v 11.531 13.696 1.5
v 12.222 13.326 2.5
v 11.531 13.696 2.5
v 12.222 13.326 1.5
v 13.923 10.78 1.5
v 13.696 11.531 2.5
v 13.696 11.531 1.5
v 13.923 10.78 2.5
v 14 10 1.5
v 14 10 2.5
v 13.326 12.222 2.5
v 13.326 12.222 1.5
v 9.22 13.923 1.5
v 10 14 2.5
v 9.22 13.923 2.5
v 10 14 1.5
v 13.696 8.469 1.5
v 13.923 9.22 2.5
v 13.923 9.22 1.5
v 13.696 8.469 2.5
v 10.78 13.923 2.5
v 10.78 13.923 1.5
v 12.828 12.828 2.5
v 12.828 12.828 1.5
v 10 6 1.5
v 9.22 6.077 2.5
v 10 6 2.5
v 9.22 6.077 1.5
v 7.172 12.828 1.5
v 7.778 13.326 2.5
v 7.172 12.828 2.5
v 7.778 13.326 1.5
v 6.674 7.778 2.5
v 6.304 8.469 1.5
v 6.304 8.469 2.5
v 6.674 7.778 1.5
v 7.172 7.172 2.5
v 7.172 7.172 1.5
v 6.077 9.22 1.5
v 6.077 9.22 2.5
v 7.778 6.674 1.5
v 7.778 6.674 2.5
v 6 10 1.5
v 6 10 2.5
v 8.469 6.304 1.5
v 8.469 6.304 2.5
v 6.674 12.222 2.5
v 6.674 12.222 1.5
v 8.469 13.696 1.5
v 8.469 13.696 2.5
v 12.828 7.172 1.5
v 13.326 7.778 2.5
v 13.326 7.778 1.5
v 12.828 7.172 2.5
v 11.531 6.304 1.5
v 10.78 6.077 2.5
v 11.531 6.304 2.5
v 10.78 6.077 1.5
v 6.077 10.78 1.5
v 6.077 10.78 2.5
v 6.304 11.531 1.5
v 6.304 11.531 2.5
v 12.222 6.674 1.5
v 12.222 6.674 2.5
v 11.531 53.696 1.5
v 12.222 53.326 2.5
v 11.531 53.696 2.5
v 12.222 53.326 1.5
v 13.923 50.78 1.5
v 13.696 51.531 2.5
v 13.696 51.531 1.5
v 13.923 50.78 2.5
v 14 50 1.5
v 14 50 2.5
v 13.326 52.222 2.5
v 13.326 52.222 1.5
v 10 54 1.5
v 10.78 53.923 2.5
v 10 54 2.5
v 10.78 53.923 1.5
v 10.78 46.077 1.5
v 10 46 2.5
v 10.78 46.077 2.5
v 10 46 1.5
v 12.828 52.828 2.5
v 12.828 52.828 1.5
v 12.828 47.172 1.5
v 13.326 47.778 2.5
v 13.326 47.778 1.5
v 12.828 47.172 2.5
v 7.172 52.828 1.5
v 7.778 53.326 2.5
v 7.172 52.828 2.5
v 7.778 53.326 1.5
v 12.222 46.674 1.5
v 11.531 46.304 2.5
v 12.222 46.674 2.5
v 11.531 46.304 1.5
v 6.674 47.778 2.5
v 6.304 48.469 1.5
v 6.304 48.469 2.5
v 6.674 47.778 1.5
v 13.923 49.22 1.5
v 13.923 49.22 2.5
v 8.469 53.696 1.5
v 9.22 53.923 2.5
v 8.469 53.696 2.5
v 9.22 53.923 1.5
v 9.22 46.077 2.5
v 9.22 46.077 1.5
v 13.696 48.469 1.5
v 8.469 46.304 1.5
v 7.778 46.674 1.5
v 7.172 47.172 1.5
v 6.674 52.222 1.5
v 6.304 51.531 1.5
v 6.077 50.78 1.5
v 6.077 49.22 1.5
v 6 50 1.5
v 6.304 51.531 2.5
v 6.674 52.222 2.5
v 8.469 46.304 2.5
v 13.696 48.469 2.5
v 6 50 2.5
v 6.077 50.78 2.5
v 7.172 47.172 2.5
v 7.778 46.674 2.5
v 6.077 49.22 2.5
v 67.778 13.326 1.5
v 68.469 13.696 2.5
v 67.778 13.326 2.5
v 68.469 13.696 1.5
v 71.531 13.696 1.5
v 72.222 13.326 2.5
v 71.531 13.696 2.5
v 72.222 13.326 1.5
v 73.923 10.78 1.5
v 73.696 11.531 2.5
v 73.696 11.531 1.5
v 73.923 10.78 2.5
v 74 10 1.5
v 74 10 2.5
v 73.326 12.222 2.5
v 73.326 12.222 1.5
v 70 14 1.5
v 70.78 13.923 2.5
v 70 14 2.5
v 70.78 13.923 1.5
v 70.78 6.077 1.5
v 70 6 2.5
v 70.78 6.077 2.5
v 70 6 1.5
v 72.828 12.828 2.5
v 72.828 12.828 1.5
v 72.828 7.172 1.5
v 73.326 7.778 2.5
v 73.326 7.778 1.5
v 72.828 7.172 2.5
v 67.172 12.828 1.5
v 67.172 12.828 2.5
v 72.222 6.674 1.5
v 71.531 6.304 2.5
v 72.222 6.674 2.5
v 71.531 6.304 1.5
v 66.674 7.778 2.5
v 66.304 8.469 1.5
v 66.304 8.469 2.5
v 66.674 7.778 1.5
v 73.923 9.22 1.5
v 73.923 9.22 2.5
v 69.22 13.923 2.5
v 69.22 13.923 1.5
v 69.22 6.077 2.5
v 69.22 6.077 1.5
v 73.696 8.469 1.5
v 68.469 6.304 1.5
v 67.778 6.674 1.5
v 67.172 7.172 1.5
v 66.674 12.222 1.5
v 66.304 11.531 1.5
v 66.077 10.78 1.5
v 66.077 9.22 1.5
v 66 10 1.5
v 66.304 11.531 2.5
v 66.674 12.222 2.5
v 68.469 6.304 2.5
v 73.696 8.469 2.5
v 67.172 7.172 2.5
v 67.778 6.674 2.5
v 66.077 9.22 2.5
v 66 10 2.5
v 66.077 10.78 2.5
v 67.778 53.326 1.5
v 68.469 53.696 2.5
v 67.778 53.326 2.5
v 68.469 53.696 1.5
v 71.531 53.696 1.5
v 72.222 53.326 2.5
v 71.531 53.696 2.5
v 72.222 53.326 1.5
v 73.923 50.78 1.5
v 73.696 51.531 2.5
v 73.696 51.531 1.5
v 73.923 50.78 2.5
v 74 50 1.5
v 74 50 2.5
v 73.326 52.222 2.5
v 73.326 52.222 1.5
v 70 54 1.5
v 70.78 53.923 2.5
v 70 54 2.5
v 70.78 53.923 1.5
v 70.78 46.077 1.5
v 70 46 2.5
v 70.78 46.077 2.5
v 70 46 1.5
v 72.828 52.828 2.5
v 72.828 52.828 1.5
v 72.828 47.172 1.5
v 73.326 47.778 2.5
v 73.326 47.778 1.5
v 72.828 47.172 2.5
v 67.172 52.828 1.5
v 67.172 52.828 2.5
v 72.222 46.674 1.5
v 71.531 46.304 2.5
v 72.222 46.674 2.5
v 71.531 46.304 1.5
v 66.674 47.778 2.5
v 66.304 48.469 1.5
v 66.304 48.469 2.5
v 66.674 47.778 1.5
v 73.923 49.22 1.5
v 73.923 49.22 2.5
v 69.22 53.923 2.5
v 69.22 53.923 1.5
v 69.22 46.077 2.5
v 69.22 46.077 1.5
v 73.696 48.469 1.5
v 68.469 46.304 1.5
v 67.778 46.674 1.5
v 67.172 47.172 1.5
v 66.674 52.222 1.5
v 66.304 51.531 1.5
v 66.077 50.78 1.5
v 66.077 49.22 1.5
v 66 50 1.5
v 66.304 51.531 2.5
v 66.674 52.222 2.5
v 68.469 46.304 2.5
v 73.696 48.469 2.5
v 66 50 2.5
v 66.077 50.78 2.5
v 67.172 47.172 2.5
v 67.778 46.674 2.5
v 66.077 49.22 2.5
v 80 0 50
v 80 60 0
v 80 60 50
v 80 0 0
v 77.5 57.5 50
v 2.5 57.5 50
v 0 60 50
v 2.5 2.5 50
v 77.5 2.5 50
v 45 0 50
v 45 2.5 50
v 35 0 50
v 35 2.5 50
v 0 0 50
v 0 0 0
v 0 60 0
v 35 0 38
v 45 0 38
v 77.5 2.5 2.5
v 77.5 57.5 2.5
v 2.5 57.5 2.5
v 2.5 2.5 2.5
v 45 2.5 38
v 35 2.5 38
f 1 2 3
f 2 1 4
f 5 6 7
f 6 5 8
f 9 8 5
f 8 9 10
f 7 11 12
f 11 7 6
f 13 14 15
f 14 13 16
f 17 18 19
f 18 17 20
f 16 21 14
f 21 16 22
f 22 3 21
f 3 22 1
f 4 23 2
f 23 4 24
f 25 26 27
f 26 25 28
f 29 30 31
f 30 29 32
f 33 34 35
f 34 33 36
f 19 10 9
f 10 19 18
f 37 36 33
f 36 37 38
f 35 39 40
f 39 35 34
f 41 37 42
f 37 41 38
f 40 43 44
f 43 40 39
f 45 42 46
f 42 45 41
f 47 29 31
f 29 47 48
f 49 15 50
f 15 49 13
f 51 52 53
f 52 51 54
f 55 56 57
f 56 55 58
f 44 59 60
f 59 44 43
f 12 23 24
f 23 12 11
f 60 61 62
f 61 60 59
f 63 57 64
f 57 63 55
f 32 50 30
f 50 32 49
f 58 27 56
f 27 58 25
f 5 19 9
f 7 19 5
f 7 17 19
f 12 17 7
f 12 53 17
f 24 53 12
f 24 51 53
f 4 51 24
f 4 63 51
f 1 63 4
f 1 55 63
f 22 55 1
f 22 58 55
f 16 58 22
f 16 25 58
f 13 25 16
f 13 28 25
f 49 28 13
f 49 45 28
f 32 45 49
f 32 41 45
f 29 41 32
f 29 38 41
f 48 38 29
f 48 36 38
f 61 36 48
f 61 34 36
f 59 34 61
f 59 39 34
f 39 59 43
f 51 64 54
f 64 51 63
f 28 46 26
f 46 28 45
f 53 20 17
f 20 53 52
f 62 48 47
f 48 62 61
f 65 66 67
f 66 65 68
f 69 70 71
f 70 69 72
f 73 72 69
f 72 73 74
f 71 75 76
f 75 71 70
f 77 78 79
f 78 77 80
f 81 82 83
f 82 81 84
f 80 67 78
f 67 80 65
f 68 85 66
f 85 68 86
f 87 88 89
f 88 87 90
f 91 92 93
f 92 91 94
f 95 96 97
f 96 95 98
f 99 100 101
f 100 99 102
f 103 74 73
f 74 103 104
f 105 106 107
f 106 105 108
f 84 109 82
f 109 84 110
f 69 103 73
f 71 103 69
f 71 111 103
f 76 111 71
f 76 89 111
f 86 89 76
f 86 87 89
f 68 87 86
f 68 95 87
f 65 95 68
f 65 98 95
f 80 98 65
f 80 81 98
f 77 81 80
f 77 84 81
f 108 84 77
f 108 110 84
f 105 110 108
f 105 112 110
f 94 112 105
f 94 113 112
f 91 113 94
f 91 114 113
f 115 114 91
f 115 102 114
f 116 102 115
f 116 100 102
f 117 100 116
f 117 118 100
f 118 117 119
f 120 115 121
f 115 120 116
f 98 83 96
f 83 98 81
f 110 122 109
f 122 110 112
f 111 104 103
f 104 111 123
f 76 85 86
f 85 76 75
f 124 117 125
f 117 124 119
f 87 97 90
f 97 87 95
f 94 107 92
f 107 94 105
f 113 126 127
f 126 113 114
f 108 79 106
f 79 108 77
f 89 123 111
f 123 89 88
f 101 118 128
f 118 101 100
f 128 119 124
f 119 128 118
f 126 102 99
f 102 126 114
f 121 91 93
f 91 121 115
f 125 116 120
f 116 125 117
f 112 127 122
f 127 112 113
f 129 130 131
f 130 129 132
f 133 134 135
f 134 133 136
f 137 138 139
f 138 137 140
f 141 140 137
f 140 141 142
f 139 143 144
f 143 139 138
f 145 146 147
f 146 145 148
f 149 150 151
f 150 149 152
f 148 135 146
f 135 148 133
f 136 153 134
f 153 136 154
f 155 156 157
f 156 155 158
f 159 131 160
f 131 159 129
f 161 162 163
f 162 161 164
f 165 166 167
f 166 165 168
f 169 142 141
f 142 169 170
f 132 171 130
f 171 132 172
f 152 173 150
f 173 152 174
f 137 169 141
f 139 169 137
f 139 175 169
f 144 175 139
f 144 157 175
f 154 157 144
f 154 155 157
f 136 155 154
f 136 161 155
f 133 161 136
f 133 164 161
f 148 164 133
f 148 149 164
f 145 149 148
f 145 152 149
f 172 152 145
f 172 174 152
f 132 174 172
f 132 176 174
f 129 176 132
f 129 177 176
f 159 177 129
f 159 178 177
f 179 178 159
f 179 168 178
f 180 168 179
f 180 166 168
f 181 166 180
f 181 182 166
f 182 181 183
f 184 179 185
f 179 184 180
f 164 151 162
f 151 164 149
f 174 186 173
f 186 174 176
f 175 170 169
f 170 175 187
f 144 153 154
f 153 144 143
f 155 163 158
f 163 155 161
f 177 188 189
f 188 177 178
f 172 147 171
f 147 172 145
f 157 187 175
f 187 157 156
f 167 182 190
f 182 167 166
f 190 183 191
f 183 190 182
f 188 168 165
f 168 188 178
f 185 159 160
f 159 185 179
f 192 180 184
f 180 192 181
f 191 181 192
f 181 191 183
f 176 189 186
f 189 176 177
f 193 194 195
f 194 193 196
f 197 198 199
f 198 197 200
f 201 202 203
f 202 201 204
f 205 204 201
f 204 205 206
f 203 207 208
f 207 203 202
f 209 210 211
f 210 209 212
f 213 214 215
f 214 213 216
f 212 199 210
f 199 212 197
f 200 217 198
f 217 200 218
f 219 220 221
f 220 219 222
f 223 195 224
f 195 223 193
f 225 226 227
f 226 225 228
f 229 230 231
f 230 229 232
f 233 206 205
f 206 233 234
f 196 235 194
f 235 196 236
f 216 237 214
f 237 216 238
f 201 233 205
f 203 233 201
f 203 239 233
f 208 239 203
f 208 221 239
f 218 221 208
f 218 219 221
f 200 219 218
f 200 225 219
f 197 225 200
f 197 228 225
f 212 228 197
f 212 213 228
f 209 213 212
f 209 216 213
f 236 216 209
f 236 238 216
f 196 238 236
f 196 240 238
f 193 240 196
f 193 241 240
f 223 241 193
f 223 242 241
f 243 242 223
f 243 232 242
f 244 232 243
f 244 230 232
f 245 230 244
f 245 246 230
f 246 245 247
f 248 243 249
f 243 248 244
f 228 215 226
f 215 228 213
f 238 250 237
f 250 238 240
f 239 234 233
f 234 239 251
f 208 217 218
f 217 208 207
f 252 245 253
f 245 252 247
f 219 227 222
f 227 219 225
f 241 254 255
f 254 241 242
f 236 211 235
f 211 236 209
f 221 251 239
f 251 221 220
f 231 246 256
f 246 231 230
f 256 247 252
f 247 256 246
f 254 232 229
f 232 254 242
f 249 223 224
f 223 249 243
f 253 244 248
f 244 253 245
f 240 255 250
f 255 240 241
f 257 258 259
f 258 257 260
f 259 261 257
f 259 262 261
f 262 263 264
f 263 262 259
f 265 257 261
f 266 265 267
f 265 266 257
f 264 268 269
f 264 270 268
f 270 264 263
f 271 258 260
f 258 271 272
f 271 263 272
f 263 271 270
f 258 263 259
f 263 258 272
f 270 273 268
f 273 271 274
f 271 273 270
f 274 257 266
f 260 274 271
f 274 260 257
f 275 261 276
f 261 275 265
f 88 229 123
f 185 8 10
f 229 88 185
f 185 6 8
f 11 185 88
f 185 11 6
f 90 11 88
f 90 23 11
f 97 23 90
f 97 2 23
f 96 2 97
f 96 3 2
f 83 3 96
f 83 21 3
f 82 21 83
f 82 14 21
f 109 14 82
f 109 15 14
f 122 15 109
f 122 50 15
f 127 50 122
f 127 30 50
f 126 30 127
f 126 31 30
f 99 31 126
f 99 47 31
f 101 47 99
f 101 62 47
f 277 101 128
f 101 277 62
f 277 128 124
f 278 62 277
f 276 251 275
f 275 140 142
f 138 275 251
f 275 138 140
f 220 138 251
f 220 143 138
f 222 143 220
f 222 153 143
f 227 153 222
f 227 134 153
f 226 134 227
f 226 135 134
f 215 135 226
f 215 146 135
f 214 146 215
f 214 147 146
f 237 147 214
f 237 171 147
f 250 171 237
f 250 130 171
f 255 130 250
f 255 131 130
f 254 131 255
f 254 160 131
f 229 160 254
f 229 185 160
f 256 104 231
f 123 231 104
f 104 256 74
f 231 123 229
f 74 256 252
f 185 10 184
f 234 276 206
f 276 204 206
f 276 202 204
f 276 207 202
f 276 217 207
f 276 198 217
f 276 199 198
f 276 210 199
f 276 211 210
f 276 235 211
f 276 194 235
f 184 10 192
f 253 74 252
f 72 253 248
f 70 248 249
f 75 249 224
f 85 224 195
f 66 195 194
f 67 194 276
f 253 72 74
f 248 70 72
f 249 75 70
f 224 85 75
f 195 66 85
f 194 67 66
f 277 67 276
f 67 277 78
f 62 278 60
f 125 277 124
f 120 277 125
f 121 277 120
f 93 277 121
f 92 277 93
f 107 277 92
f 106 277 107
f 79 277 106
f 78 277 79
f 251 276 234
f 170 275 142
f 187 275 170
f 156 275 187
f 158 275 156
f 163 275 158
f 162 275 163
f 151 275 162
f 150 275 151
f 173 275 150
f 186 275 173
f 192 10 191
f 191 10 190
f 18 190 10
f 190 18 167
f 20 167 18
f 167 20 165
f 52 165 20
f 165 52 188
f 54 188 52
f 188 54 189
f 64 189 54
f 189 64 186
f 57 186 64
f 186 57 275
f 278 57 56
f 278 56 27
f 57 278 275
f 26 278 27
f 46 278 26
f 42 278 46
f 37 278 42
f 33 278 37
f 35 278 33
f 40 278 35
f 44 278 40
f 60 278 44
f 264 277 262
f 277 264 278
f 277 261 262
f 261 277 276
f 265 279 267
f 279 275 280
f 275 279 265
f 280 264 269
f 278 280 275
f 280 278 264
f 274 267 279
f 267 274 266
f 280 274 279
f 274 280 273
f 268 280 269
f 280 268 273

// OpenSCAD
$fn = 32;

// ----------------------------------------------------------------------
// Enclosure box: both enclosure
// ----------------------------------------------------------------------

// --- parameters (mm) ---
box_l = 80;               // outer length, X
box_w = 60;               // outer width, Y
box_h = 50;               // outer height
wall_t = 2.5;             // wall thickness
boss_r = 4;               // corner boss radius
hole_r = 1.5;             // boss screw hole radius
boss_in = 10;             // boss inset from the corners
notch_w = 10;             // cable notch width
notch_h = 12;             // cable notch height

inner_h = box_h - wall_t;  // cavity depth
boss_h = inner_h - 2;  // corner boss height

difference() {
  cube([box_l, box_w, box_h]);
  translate([wall_t, wall_t, wall_t])
    cube([box_l - 2 * wall_t, box_w - 2 * wall_t, box_h]);
  for (sx = [0, 1], sy = [0, 1])
    translate([sx ? box_l - boss_in : boss_in,
               sy ? box_w - boss_in : boss_in, wall_t - 1]) {
      cylinder(r = boss_r, h = boss_h);
      translate([0, 0, boss_h - 4])
        cylinder(r = hole_r, h = 5);
    }
  translate([box_l / 2 - notch_w / 2, -1, box_h - notch_h])
    cube([notch_w, wall_t + 2, notch_h + 1]);
}
